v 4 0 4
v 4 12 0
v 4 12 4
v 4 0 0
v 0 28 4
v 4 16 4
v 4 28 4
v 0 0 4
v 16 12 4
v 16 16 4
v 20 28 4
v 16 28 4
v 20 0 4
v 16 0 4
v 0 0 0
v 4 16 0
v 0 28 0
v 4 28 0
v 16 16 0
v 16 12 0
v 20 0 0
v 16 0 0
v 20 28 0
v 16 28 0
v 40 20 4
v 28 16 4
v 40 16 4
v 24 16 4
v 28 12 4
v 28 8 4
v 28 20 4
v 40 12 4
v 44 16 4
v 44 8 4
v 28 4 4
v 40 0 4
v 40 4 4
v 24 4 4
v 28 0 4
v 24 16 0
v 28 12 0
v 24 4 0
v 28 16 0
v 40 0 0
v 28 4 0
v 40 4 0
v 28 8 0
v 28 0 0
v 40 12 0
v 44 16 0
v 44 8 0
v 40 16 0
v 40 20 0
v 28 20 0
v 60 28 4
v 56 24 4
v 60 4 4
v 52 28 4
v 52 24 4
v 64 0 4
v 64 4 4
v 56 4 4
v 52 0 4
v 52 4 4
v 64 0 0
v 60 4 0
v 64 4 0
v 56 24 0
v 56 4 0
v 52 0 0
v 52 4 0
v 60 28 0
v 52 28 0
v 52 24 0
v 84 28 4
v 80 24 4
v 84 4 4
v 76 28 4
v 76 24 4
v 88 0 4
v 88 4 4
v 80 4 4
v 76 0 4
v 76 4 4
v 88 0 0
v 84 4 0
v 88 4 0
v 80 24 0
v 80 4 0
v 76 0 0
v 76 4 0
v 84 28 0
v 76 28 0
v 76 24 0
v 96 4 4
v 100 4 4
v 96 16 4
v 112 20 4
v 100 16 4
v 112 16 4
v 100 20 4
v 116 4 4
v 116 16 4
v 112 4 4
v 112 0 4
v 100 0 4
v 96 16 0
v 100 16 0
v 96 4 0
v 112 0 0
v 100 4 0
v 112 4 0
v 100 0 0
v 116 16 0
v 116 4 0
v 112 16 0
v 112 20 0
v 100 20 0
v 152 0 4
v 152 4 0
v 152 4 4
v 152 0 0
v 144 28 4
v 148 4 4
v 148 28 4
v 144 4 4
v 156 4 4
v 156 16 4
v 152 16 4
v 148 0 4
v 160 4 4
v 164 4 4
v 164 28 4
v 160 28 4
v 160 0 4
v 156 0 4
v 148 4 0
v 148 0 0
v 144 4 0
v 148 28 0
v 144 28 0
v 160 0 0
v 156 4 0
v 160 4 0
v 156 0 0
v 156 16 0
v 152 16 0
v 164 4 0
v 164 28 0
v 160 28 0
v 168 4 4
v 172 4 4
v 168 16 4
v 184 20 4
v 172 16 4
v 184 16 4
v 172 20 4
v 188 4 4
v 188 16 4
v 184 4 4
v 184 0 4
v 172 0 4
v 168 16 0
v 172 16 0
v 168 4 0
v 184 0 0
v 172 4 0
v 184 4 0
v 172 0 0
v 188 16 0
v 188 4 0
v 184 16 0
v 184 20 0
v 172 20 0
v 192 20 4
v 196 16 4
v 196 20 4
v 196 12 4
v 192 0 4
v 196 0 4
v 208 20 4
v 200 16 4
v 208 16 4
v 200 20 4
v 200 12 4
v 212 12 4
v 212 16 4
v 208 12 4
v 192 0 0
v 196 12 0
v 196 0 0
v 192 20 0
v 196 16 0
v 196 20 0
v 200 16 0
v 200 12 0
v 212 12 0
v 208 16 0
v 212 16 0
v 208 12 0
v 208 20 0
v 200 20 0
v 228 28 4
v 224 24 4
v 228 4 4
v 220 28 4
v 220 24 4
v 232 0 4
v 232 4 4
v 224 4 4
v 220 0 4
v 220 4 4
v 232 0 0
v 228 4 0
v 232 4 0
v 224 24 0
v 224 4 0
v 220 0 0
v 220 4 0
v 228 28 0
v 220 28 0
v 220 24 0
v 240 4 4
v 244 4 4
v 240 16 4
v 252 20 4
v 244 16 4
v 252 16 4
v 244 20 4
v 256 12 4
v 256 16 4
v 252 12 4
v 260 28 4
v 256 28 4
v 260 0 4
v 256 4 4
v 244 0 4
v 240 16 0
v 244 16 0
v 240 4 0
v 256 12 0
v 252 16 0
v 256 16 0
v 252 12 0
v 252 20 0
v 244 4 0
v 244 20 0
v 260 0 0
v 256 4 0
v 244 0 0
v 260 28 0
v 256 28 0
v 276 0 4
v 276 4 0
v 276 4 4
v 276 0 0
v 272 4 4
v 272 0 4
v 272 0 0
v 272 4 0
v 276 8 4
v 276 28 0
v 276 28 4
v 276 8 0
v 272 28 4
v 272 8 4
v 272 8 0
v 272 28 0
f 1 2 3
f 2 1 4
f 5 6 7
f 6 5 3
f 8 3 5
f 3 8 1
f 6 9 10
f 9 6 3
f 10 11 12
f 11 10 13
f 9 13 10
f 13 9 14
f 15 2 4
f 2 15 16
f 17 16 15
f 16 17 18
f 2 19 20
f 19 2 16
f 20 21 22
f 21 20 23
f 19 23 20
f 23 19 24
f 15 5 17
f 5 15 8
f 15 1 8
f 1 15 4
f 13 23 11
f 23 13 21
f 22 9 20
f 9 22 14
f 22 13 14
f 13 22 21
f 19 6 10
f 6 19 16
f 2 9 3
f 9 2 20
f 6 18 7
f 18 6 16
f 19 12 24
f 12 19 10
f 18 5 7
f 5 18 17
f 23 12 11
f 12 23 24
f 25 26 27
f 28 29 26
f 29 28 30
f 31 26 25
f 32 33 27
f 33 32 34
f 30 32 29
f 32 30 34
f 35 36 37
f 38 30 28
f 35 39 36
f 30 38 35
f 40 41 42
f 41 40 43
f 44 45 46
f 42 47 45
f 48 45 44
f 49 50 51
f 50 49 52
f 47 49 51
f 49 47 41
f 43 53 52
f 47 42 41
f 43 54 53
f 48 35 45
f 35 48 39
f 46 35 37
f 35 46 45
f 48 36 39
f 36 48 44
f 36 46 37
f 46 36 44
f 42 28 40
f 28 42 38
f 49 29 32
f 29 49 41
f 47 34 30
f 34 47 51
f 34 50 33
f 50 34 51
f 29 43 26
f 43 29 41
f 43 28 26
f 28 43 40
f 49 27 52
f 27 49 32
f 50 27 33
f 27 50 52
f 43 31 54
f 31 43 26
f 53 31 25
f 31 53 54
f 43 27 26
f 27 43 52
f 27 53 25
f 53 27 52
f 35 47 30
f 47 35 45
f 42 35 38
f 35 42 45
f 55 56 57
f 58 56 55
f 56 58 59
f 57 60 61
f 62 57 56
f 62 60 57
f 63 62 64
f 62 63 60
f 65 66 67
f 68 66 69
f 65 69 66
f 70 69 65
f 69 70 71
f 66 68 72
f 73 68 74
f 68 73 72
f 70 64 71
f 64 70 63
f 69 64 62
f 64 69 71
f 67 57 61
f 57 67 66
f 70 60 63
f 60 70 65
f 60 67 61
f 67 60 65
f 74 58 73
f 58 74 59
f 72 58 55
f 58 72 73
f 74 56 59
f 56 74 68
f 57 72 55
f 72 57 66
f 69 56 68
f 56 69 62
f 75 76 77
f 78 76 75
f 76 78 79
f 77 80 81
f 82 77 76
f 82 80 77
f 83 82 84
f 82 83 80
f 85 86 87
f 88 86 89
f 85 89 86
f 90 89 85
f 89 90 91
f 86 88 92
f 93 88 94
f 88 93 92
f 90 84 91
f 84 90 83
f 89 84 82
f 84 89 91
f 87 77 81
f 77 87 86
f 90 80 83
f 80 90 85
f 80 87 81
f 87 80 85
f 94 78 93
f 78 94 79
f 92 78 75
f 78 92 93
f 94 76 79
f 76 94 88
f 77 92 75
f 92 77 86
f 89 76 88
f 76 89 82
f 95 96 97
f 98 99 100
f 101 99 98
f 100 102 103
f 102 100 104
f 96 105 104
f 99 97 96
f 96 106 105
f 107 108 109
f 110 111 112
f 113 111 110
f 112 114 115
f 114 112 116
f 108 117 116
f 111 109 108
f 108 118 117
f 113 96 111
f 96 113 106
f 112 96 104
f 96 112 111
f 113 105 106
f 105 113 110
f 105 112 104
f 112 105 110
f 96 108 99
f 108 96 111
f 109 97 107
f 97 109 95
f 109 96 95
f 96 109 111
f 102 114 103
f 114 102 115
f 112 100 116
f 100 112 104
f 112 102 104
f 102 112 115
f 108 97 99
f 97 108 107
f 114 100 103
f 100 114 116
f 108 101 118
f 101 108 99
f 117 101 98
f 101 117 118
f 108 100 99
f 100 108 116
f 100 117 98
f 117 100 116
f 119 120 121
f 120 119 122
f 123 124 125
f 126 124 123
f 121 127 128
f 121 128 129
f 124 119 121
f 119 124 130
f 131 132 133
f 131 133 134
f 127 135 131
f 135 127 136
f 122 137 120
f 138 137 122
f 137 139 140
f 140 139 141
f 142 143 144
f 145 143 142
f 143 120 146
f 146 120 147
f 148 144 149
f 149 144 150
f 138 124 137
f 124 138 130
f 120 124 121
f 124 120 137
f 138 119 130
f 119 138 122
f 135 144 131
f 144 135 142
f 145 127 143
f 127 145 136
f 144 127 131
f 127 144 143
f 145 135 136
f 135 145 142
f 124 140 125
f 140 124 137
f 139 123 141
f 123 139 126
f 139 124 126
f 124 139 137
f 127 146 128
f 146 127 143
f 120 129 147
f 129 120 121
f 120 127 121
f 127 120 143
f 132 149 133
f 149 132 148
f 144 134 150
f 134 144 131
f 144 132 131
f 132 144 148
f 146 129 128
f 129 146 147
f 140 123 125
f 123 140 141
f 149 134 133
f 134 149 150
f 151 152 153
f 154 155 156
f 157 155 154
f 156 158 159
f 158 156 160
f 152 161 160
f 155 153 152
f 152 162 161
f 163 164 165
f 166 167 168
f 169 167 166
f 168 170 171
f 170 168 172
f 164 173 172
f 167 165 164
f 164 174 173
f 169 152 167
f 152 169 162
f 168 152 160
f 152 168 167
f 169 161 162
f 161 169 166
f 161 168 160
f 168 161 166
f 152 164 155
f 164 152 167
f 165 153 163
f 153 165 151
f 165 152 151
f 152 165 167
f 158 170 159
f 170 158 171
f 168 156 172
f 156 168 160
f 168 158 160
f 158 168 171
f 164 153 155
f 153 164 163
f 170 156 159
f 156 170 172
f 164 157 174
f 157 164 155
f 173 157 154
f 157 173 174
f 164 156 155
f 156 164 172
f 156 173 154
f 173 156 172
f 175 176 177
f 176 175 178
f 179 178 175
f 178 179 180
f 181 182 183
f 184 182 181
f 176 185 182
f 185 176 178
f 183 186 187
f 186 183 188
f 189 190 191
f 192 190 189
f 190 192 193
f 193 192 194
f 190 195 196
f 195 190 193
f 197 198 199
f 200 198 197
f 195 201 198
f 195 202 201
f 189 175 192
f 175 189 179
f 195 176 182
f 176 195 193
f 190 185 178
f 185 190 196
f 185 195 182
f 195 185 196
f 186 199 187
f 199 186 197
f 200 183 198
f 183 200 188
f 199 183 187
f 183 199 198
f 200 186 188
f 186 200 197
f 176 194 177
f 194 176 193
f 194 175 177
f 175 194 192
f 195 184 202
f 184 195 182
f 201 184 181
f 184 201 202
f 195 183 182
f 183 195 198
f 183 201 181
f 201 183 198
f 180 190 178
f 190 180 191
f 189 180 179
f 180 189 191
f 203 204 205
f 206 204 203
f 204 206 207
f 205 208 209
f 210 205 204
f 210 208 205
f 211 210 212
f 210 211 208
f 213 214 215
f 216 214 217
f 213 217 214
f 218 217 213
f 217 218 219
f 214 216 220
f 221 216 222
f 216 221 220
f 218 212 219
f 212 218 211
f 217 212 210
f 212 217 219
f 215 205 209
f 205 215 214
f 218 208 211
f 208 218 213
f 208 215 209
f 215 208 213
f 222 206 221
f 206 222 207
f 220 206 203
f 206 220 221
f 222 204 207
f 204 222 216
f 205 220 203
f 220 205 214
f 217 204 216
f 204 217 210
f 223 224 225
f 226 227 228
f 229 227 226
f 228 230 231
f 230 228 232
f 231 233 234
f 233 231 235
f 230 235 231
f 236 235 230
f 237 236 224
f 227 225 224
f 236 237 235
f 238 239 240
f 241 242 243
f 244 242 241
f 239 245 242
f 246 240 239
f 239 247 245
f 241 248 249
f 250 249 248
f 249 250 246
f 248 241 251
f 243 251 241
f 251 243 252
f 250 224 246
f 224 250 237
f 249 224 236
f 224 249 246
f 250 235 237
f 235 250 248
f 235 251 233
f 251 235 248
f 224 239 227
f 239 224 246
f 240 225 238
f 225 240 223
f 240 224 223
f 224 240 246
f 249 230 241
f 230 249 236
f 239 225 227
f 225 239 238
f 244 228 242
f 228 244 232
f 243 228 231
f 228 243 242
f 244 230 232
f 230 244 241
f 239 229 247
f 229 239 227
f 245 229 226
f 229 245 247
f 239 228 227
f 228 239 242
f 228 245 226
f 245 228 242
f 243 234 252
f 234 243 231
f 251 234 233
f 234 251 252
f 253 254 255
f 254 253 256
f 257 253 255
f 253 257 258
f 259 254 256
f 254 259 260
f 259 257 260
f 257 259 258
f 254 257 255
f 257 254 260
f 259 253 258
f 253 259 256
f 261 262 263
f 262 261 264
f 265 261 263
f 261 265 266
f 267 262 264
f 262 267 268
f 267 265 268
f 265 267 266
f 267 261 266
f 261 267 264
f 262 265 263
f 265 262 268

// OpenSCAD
// @url https://www.thingiverse.com/thing:59817

//Draw text
scale([4,4,4]) drawtext("Hello World!");

//Draw character set
//scale([2,2,2]) drawtext(" !\"#$%&'()*+,-./0123456789:;<=>?@ABCDEFGHIJKLMNOPQRSTUVWXYZ[\\]^_`abcdefghijklmnopqrstuvwxyz{|}");

module drawtext(text) {
	//Characters
	chars = " !\"#$%&'()*+,-./0123456789:;<=>?@ABCDEFGHIJKLMNOPQRSTUVWXYZ[\\]^_`abcdefghijklmnopqrstuvwxyz{|}";

	//Chracter table defining 5x7 characters
	//Adapted from: http://www.geocities.com/dinceraydin/djlcdsim/chartable.js
	char_table = [ [ 0, 0, 0, 0, 0, 0, 0],
                  [ 4, 0, 4, 4, 4, 4, 4],
                  [ 0, 0, 0, 0,10,10,10],
                  [10,10,31,10,31,10,10],
                  [ 4,30, 5,14,20,15, 4],
                  [ 3,19, 8, 4, 2,25,24],
                  [13,18,21, 8,20,18,12],
                  [ 0, 0, 0, 0, 8, 4,12],
                  [ 2, 4, 8, 8, 8, 4, 2],
                  [ 8, 4, 2, 2, 2, 4, 8],
                  [ 0, 4,21,14,21, 4, 0],
                  [ 0, 4, 4,31, 4, 4, 0],
                  [ 8, 4,12, 0, 0, 0, 0],
                  [ 0, 0, 0,31, 0, 0, 0],
                  [12,12, 0, 0, 0, 0, 0],
                  [ 0,16, 8, 4, 2, 1, 0],
                  [14,17,25,21,19,17,14],
                  [14, 4, 4, 4, 4,12, 4],
                  [31, 8, 4, 2, 1,17,14],
                  [14,17, 1, 2, 4, 2,31],
                  [ 2, 2,31,18,10, 6, 2],
                  [14,17, 1, 1,30,16,31],
                  [14,17,17,30,16, 8, 6],
                  [ 8, 8, 8, 4, 2, 1,31],
                  [14,17,17,14,17,17,14],
                  [12, 2, 1,15,17,17,14],
                  [ 0,12,12, 0,12,12, 0],
                  [ 8, 4,12, 0,12,12, 0],
                  [ 2, 4, 8,16, 8, 4, 2],
                  [ 0, 0,31, 0,31, 0, 0],
                  [16, 8, 4, 2, 4, 8,16],
                  [ 4, 0, 4, 2, 1,17,14],
                  [14,21,21,13, 1,17,14],
                  [17,17,31,17,17,17,14],
                  [30,17,17,30,17,17,30],
                  [14,17,16,16,16,17,14],
                  [30,17,17,17,17,17,30],
                  [31,16,16,30,16,16,31],
                  [16,16,16,30,16,16,31],
                  [15,17,17,23,16,17,14],
                  [17,17,17,31,17,17,17],
                  [14, 4, 4, 4, 4, 4,14],
                  [12,18, 2, 2, 2, 2, 7],
                  [17,18,20,24,20,18,17],
                  [31,16,16,16,16,16,16],
                  [17,17,17,21,21,27,17],
                  [17,17,19,21,25,17,17],
                  [14,17,17,17,17,17,14],
                  [16,16,16,30,17,17,30],
                  [13,18,21,17,17,17,14],
                  [17,18,20,30,17,17,30],
                  [30, 1, 1,14,16,16,15],
                  [ 4, 4, 4, 4, 4, 4,31],
                  [14,17,17,17,17,17,17],
                  [ 4,10,17,17,17,17,17],
                  [10,21,21,21,17,17,17],
                  [17,17,10, 4,10,17,17],
                  [ 4, 4, 4,10,17,17,17],
                  [31,16, 8, 4, 2, 1,31],
                  [14, 8, 8, 8, 8, 8,14],
                  [ 0, 1, 2, 4, 8,16, 0],
                  [14, 2, 2, 2, 2, 2,14],
                  [ 0, 0, 0, 0,17,10, 4],
                  [31, 0, 0, 0, 0, 0, 0],
                  [ 0, 0, 0, 0, 2, 4, 8],
                  [15,17,15, 1,14, 0, 0],
                  [30,17,17,25,22,16,16],
                  [14,17,16,16,14, 0, 0],
                  [15,17,17,19,13, 1, 1],
                  [14,16,31,17,14, 0, 0],
                  [ 8, 8, 8,28, 8, 9, 6],
                  [14, 1,15,17,15, 0, 0],
                  [17,17,17,25,22,16,16],
                  [14, 4, 4, 4,12, 0, 4],
                  [12,18, 2, 2, 2, 6, 2],
                  [18,20,24,20,18,16,16],
                  [14, 4, 4, 4, 4, 4,12],
                  [17,17,21,21,26, 0, 0],
                  [17,17,17,25,22, 0, 0],
                  [14,17,17,17,14, 0, 0],
                  [16,16,30,17,30, 0, 0],
                  [ 1, 1,15,19,13, 0, 0],
                  [16,16,16,25,22, 0, 0],
                  [30, 1,14,16,15, 0, 0],
                  [ 6, 9, 8, 8,28, 8, 8],
                  [13,19,17,17,17, 0, 0],
                  [ 4,10,17,17,17, 0, 0],
                  [10,21,21,17,17, 0, 0],
                  [17,10, 4,10,17, 0, 0],
                  [14, 1,15,17,17, 0, 0],
                  [31, 8, 4, 2,31, 0, 0],
                  [ 2, 4, 4, 8, 4, 4, 2],
                  [ 4, 4, 4, 4, 4, 4, 4],
                  [ 8, 4, 4, 2, 4, 4, 8] ];

	//Binary decode table
	dec_table = [ "00000", "00001", "00010", "00011", "00100", "00101",
  	            "00110", "00111", "01000", "01001", "01010", "01011",
  	            "01100", "01101", "01110", "01111", "10000", "10001",
  	            "10010", "10011", "10100", "10101", "10110", "10111",
	            "11000", "11001", "11010", "11011", "11100", "11101",
	            "11110", "11111" ];

	//Process string one character at a time
	for(itext = [0:len(text)-1]) {
		//Convert character to index
		ichar = search(text[itext],chars,1)[0];

        //Decode character - rows
        for(irow = [0:6]) {
            //Select value to draw from table
            val = dec_table[char_table[ichar][irow]];

            //Decode character - cols
            for(icol = [0:4]) {
                // Retrieve bit to draw
                bit = search(val[icol],"01",1)[0];

                if(bit) {
                    //Output cube
                    translate([icol + (6*itext), irow, 0])
                        cube([1.0001,1.0001,1]);
                }
            }
        }
	}
}
